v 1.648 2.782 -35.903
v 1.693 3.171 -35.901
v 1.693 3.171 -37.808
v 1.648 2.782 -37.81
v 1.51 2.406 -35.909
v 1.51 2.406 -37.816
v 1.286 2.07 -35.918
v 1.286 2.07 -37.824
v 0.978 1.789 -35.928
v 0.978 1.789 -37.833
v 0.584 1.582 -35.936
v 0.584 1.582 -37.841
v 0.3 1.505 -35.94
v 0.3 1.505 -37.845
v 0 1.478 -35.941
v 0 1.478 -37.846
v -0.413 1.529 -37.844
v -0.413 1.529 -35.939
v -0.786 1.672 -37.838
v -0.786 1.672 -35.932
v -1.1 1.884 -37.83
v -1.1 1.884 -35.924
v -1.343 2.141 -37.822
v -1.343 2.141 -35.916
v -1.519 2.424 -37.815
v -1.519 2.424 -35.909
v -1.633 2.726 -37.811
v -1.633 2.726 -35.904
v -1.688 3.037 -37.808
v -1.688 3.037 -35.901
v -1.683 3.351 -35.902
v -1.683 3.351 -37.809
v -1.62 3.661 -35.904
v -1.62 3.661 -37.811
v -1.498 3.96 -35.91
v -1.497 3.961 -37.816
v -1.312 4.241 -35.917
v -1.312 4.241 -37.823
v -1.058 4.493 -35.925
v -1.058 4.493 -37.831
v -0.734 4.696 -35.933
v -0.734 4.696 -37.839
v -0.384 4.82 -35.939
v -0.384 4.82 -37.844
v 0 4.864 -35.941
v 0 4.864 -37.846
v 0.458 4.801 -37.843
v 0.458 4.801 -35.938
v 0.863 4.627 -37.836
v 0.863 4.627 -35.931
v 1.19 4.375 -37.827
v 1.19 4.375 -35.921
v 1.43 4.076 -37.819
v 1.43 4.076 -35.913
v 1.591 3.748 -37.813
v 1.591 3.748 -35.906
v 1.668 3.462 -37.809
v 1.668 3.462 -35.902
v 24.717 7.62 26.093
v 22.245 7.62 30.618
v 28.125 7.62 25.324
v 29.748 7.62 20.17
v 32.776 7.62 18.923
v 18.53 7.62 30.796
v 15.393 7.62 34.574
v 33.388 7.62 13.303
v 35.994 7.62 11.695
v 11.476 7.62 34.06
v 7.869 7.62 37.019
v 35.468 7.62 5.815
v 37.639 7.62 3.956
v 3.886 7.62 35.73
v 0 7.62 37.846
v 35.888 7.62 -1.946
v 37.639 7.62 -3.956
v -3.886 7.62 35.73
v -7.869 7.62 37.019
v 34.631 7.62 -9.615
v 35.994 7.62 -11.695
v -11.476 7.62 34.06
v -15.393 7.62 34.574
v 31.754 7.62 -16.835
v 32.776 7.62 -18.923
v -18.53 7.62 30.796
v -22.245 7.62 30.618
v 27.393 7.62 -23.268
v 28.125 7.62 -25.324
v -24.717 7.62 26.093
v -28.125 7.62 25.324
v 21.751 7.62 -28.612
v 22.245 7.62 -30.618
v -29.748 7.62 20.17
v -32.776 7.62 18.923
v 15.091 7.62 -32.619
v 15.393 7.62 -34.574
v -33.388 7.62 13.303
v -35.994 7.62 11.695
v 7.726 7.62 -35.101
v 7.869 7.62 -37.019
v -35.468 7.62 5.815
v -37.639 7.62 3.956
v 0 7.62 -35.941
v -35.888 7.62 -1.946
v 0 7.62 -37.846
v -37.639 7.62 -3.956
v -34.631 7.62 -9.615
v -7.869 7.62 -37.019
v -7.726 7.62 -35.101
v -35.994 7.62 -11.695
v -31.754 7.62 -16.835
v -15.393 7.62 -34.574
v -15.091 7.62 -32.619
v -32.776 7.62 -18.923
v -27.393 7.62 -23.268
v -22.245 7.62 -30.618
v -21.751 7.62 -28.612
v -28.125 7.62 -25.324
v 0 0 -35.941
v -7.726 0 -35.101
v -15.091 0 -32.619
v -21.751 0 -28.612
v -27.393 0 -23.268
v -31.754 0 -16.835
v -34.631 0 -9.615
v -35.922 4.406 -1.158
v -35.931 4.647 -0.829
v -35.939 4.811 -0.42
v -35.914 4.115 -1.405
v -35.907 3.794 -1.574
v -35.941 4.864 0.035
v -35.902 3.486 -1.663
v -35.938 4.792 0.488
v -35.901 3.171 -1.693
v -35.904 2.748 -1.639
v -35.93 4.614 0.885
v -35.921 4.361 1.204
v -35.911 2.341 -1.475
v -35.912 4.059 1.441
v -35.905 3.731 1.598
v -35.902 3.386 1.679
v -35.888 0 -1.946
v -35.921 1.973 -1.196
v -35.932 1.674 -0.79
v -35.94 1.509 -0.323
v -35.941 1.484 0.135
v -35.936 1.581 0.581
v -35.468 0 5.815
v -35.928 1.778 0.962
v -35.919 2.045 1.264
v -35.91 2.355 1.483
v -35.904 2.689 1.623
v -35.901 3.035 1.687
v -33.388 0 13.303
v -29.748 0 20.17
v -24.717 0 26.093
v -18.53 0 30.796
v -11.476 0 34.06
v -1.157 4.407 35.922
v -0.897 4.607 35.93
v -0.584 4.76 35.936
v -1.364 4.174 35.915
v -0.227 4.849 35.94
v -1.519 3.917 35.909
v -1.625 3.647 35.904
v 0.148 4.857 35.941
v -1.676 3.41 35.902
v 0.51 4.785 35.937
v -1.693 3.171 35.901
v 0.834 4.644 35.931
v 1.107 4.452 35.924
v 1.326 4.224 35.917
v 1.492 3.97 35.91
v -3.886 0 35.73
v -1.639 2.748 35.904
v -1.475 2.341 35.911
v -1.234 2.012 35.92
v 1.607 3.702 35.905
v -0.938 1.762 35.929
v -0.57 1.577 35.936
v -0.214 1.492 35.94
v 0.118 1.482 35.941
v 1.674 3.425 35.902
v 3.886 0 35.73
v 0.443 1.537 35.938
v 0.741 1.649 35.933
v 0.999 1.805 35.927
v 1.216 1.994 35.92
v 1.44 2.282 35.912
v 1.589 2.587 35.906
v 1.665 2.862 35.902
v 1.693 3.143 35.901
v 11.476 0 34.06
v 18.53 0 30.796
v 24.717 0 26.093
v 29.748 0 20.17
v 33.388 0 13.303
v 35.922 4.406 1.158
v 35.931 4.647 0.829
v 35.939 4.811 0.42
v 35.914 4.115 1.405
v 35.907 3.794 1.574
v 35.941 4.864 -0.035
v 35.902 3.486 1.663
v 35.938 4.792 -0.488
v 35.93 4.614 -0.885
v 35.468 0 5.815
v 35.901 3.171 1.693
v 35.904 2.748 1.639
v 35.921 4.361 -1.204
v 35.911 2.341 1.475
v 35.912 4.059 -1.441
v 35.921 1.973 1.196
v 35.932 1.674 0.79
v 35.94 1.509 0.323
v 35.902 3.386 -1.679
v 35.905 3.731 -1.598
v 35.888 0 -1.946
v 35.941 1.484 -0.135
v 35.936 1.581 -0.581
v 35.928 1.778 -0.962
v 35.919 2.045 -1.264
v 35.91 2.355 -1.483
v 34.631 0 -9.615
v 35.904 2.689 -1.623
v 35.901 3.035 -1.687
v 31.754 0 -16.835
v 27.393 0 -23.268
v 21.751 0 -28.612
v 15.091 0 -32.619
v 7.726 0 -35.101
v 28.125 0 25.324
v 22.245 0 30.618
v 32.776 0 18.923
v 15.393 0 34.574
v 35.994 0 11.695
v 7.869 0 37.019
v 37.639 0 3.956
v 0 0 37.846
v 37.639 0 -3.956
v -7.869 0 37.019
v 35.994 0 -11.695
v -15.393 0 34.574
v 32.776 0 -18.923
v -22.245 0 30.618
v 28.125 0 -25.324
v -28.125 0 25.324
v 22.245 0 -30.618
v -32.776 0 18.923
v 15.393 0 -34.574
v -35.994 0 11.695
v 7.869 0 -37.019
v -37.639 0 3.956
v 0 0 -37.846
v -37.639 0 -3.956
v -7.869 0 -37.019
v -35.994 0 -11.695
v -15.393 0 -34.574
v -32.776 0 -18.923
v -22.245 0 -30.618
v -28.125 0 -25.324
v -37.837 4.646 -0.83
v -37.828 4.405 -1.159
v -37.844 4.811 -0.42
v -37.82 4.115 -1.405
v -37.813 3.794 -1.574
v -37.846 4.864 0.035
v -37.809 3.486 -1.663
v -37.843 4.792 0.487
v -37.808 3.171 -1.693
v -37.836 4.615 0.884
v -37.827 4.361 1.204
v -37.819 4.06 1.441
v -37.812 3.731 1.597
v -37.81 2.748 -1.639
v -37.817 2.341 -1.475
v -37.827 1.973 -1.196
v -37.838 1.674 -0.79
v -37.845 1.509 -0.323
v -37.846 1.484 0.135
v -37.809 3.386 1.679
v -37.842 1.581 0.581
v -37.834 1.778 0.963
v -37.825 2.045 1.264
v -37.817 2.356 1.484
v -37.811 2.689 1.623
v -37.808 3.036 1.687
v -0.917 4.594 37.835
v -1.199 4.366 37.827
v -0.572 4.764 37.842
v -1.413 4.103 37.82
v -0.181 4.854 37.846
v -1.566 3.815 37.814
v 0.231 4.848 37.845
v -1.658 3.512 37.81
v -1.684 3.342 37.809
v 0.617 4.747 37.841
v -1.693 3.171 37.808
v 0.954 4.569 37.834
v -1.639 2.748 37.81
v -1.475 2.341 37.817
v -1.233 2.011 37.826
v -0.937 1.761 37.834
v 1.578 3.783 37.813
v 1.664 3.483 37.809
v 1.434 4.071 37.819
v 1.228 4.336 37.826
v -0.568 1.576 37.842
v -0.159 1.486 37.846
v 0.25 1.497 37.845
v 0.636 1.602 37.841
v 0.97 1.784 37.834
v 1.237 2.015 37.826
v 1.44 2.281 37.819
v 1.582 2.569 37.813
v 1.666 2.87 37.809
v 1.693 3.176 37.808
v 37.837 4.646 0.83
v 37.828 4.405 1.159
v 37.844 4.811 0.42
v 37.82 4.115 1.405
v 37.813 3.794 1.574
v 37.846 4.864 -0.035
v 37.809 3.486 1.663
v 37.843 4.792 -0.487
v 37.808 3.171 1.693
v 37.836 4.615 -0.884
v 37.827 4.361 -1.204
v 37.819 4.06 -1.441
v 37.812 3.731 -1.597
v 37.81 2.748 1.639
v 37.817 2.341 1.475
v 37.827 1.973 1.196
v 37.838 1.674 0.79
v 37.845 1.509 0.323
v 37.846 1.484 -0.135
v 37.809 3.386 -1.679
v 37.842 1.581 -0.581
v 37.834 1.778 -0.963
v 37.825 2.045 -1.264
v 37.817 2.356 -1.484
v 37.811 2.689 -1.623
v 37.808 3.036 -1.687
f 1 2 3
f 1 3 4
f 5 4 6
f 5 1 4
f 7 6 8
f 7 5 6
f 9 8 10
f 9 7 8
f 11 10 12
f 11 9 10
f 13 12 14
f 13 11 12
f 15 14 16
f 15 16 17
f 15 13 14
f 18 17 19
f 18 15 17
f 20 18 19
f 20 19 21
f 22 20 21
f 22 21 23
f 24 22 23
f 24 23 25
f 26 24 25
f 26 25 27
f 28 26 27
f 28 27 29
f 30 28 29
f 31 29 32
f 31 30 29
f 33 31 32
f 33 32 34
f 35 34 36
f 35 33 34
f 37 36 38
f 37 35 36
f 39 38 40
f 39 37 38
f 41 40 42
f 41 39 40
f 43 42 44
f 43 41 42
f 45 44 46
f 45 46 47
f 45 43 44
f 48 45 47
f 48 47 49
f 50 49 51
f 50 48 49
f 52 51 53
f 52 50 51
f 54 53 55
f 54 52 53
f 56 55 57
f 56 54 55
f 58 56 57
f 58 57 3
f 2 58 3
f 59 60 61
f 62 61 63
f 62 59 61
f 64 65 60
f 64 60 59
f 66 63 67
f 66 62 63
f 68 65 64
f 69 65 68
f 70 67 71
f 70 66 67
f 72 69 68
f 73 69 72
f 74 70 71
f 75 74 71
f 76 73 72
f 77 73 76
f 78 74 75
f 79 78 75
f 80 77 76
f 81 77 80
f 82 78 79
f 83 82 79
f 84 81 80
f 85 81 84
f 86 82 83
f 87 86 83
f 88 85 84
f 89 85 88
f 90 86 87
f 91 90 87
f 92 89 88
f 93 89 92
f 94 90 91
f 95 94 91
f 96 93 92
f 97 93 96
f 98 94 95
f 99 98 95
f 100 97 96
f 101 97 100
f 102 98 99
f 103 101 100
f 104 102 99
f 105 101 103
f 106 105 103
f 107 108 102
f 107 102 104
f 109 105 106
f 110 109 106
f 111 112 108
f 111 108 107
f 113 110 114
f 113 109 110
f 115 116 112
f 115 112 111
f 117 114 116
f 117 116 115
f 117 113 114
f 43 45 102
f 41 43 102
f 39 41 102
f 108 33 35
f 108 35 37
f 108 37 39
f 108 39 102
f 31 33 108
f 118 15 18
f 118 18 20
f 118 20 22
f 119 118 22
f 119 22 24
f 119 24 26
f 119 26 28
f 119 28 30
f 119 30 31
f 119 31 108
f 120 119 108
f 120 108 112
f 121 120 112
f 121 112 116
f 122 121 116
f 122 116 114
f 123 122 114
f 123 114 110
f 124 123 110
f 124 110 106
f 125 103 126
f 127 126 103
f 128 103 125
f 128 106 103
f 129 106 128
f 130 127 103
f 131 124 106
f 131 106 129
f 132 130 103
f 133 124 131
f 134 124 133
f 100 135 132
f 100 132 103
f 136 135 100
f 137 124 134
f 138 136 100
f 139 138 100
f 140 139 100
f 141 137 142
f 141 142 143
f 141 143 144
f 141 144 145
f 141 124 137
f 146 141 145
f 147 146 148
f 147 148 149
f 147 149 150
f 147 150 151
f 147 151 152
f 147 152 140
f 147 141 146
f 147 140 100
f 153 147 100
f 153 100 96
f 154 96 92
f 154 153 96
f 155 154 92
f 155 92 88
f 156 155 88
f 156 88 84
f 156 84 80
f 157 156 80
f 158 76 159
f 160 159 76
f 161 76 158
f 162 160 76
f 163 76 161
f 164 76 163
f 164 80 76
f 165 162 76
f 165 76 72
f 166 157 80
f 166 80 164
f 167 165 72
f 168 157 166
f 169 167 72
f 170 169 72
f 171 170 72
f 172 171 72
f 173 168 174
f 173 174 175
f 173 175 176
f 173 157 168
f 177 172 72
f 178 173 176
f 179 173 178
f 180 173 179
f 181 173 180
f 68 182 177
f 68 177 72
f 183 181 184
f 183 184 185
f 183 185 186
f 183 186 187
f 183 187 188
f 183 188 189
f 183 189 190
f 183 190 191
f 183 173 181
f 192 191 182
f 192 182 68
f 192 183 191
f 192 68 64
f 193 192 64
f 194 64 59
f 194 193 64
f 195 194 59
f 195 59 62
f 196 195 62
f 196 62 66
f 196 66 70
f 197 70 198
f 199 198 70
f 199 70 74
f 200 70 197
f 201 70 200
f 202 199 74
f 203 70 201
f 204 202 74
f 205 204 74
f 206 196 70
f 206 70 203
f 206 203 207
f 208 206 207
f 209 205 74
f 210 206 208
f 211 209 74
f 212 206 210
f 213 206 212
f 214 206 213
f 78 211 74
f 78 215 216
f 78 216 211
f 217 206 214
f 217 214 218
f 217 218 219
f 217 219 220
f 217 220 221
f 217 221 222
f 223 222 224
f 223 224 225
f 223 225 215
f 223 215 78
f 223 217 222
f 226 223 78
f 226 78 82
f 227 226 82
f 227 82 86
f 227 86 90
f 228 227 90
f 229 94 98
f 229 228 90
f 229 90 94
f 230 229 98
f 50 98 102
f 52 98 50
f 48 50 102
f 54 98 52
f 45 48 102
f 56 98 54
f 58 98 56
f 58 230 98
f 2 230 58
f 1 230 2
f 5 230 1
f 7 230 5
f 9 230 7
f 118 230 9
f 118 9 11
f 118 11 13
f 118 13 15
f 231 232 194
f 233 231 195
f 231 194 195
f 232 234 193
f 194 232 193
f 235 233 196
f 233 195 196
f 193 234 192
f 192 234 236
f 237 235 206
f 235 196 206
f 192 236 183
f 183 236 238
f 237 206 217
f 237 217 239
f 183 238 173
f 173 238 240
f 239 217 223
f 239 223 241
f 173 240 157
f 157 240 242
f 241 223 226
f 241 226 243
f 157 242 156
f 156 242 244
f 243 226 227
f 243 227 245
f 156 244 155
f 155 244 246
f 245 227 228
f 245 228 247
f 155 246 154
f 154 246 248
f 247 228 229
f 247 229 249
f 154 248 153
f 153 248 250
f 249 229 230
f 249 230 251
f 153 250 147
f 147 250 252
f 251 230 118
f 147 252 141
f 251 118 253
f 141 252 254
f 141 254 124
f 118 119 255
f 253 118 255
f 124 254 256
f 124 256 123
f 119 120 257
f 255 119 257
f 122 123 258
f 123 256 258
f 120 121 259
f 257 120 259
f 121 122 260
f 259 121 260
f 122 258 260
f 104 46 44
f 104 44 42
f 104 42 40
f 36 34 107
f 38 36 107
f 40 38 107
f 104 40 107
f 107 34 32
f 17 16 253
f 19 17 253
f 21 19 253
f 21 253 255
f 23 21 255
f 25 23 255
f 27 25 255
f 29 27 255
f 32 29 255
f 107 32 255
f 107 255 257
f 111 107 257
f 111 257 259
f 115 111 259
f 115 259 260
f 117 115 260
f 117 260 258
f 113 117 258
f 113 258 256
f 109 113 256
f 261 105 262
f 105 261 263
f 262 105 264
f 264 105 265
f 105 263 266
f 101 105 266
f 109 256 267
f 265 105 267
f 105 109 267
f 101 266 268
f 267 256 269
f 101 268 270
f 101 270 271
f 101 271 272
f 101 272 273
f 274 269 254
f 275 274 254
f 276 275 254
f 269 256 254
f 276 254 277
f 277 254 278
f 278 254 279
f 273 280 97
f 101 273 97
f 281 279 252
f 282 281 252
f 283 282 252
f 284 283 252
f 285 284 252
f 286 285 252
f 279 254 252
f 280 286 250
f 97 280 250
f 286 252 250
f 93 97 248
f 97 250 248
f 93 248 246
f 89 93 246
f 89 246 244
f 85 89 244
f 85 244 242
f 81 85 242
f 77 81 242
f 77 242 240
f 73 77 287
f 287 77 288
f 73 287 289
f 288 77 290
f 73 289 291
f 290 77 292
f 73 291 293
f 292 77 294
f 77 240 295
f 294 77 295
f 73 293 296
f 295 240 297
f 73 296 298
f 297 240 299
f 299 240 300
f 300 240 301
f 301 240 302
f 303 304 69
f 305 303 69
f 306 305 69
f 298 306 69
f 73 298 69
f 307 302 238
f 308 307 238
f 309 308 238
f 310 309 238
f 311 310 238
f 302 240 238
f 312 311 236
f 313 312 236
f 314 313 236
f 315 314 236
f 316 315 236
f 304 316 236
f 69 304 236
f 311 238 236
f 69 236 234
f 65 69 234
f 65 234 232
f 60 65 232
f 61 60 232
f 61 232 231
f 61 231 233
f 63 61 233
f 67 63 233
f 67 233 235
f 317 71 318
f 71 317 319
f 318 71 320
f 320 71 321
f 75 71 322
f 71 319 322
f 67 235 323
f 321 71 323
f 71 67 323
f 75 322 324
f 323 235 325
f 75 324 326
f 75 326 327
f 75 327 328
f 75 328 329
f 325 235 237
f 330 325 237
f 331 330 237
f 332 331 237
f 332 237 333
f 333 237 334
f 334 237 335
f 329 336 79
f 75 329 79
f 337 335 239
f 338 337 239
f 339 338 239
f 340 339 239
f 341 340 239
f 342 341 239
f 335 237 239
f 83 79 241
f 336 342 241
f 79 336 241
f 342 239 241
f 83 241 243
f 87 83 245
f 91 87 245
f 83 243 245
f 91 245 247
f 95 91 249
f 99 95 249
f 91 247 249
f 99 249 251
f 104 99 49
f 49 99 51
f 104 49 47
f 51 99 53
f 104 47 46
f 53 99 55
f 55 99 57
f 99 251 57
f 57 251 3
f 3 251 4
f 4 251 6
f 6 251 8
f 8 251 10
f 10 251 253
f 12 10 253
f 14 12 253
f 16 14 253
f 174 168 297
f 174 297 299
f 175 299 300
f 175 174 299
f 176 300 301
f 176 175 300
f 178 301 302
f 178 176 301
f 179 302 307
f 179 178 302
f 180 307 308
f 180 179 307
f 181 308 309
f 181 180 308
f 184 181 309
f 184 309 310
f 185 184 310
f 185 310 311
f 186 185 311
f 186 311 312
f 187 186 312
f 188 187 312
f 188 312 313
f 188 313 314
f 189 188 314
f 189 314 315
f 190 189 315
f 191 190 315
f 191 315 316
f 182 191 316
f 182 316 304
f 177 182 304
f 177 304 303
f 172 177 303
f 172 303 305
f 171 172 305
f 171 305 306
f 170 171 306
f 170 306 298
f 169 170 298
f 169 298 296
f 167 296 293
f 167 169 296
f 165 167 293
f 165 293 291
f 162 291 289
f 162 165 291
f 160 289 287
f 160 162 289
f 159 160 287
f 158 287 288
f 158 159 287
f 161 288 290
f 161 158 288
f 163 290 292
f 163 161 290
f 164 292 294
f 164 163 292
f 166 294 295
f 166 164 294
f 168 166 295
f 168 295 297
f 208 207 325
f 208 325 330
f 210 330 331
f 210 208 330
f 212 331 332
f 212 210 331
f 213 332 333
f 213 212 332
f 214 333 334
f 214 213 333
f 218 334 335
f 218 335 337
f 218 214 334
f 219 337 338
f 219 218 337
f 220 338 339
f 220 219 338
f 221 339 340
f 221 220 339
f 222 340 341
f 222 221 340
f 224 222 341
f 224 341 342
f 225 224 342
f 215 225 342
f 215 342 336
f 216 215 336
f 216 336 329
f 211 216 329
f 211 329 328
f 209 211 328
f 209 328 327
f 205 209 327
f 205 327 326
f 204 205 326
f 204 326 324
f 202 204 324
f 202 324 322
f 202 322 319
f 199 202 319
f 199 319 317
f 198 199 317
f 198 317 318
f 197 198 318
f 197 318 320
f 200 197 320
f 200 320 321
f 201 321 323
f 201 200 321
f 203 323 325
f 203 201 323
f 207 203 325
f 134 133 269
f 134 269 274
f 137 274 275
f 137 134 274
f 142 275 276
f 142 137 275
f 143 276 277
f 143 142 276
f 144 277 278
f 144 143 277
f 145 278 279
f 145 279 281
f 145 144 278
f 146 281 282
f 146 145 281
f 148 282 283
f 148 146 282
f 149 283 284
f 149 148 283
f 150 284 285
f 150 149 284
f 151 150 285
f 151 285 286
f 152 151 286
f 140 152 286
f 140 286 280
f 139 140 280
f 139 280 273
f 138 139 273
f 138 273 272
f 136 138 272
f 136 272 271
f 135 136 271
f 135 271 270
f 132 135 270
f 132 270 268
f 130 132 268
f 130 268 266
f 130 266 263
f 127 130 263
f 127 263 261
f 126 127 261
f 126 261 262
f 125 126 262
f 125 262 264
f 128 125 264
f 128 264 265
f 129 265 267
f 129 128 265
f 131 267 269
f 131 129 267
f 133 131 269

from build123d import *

# Parameters (mm, degrees)
SKETCH1_R           = 37.846
SKETCH1_R_2         = 35.941
BOSS_EXTRUDE1_DEPTH = 7.62
SKETCH2_R           = 1.692869147
CUT_EXTRUDE1_DEPTH  = 86.62
CIRPATTERN1_COUNT   = 4


with BuildPart() as part:
    # Sketch1 → Boss-Extrude1 (new body)
    with BuildSketch(Plane(origin=(0, 0, 0), x_dir=(1, 0, 0), z_dir=(0, 1, 0))):
        with Locations(Location((0, 0, 0), (0, 0, 90))):
            Circle(SKETCH1_R)
        with Locations(Location((0, 0, 0), (0, 0, 90))):
            Circle(SKETCH1_R_2, mode=Mode.SUBTRACT)
    extrude(amount=BOSS_EXTRUDE1_DEPTH)

    # Sketch2 → Cut-Extrude1 (cut)
    with BuildSketch(Plane.XY):
        with Locations(Location((0, 3.171011831, 0), (0, 0, 180))):
            Circle(SKETCH2_R)
    cut_extrude1 = extrude(amount=CUT_EXTRUDE1_DEPTH, mode=Mode.SUBTRACT)

    # CirPattern1: Cut-Extrude1 ×4 about axis
    cirpattern1_axis = Axis((0, 7.62, 0), (0, -1, 0))
    for i in range(1, CIRPATTERN1_COUNT):
        add(cut_extrude1.rotate(cirpattern1_axis, i * 360 / CIRPATTERN1_COUNT), mode=Mode.SUBTRACT)


solid = part.part
